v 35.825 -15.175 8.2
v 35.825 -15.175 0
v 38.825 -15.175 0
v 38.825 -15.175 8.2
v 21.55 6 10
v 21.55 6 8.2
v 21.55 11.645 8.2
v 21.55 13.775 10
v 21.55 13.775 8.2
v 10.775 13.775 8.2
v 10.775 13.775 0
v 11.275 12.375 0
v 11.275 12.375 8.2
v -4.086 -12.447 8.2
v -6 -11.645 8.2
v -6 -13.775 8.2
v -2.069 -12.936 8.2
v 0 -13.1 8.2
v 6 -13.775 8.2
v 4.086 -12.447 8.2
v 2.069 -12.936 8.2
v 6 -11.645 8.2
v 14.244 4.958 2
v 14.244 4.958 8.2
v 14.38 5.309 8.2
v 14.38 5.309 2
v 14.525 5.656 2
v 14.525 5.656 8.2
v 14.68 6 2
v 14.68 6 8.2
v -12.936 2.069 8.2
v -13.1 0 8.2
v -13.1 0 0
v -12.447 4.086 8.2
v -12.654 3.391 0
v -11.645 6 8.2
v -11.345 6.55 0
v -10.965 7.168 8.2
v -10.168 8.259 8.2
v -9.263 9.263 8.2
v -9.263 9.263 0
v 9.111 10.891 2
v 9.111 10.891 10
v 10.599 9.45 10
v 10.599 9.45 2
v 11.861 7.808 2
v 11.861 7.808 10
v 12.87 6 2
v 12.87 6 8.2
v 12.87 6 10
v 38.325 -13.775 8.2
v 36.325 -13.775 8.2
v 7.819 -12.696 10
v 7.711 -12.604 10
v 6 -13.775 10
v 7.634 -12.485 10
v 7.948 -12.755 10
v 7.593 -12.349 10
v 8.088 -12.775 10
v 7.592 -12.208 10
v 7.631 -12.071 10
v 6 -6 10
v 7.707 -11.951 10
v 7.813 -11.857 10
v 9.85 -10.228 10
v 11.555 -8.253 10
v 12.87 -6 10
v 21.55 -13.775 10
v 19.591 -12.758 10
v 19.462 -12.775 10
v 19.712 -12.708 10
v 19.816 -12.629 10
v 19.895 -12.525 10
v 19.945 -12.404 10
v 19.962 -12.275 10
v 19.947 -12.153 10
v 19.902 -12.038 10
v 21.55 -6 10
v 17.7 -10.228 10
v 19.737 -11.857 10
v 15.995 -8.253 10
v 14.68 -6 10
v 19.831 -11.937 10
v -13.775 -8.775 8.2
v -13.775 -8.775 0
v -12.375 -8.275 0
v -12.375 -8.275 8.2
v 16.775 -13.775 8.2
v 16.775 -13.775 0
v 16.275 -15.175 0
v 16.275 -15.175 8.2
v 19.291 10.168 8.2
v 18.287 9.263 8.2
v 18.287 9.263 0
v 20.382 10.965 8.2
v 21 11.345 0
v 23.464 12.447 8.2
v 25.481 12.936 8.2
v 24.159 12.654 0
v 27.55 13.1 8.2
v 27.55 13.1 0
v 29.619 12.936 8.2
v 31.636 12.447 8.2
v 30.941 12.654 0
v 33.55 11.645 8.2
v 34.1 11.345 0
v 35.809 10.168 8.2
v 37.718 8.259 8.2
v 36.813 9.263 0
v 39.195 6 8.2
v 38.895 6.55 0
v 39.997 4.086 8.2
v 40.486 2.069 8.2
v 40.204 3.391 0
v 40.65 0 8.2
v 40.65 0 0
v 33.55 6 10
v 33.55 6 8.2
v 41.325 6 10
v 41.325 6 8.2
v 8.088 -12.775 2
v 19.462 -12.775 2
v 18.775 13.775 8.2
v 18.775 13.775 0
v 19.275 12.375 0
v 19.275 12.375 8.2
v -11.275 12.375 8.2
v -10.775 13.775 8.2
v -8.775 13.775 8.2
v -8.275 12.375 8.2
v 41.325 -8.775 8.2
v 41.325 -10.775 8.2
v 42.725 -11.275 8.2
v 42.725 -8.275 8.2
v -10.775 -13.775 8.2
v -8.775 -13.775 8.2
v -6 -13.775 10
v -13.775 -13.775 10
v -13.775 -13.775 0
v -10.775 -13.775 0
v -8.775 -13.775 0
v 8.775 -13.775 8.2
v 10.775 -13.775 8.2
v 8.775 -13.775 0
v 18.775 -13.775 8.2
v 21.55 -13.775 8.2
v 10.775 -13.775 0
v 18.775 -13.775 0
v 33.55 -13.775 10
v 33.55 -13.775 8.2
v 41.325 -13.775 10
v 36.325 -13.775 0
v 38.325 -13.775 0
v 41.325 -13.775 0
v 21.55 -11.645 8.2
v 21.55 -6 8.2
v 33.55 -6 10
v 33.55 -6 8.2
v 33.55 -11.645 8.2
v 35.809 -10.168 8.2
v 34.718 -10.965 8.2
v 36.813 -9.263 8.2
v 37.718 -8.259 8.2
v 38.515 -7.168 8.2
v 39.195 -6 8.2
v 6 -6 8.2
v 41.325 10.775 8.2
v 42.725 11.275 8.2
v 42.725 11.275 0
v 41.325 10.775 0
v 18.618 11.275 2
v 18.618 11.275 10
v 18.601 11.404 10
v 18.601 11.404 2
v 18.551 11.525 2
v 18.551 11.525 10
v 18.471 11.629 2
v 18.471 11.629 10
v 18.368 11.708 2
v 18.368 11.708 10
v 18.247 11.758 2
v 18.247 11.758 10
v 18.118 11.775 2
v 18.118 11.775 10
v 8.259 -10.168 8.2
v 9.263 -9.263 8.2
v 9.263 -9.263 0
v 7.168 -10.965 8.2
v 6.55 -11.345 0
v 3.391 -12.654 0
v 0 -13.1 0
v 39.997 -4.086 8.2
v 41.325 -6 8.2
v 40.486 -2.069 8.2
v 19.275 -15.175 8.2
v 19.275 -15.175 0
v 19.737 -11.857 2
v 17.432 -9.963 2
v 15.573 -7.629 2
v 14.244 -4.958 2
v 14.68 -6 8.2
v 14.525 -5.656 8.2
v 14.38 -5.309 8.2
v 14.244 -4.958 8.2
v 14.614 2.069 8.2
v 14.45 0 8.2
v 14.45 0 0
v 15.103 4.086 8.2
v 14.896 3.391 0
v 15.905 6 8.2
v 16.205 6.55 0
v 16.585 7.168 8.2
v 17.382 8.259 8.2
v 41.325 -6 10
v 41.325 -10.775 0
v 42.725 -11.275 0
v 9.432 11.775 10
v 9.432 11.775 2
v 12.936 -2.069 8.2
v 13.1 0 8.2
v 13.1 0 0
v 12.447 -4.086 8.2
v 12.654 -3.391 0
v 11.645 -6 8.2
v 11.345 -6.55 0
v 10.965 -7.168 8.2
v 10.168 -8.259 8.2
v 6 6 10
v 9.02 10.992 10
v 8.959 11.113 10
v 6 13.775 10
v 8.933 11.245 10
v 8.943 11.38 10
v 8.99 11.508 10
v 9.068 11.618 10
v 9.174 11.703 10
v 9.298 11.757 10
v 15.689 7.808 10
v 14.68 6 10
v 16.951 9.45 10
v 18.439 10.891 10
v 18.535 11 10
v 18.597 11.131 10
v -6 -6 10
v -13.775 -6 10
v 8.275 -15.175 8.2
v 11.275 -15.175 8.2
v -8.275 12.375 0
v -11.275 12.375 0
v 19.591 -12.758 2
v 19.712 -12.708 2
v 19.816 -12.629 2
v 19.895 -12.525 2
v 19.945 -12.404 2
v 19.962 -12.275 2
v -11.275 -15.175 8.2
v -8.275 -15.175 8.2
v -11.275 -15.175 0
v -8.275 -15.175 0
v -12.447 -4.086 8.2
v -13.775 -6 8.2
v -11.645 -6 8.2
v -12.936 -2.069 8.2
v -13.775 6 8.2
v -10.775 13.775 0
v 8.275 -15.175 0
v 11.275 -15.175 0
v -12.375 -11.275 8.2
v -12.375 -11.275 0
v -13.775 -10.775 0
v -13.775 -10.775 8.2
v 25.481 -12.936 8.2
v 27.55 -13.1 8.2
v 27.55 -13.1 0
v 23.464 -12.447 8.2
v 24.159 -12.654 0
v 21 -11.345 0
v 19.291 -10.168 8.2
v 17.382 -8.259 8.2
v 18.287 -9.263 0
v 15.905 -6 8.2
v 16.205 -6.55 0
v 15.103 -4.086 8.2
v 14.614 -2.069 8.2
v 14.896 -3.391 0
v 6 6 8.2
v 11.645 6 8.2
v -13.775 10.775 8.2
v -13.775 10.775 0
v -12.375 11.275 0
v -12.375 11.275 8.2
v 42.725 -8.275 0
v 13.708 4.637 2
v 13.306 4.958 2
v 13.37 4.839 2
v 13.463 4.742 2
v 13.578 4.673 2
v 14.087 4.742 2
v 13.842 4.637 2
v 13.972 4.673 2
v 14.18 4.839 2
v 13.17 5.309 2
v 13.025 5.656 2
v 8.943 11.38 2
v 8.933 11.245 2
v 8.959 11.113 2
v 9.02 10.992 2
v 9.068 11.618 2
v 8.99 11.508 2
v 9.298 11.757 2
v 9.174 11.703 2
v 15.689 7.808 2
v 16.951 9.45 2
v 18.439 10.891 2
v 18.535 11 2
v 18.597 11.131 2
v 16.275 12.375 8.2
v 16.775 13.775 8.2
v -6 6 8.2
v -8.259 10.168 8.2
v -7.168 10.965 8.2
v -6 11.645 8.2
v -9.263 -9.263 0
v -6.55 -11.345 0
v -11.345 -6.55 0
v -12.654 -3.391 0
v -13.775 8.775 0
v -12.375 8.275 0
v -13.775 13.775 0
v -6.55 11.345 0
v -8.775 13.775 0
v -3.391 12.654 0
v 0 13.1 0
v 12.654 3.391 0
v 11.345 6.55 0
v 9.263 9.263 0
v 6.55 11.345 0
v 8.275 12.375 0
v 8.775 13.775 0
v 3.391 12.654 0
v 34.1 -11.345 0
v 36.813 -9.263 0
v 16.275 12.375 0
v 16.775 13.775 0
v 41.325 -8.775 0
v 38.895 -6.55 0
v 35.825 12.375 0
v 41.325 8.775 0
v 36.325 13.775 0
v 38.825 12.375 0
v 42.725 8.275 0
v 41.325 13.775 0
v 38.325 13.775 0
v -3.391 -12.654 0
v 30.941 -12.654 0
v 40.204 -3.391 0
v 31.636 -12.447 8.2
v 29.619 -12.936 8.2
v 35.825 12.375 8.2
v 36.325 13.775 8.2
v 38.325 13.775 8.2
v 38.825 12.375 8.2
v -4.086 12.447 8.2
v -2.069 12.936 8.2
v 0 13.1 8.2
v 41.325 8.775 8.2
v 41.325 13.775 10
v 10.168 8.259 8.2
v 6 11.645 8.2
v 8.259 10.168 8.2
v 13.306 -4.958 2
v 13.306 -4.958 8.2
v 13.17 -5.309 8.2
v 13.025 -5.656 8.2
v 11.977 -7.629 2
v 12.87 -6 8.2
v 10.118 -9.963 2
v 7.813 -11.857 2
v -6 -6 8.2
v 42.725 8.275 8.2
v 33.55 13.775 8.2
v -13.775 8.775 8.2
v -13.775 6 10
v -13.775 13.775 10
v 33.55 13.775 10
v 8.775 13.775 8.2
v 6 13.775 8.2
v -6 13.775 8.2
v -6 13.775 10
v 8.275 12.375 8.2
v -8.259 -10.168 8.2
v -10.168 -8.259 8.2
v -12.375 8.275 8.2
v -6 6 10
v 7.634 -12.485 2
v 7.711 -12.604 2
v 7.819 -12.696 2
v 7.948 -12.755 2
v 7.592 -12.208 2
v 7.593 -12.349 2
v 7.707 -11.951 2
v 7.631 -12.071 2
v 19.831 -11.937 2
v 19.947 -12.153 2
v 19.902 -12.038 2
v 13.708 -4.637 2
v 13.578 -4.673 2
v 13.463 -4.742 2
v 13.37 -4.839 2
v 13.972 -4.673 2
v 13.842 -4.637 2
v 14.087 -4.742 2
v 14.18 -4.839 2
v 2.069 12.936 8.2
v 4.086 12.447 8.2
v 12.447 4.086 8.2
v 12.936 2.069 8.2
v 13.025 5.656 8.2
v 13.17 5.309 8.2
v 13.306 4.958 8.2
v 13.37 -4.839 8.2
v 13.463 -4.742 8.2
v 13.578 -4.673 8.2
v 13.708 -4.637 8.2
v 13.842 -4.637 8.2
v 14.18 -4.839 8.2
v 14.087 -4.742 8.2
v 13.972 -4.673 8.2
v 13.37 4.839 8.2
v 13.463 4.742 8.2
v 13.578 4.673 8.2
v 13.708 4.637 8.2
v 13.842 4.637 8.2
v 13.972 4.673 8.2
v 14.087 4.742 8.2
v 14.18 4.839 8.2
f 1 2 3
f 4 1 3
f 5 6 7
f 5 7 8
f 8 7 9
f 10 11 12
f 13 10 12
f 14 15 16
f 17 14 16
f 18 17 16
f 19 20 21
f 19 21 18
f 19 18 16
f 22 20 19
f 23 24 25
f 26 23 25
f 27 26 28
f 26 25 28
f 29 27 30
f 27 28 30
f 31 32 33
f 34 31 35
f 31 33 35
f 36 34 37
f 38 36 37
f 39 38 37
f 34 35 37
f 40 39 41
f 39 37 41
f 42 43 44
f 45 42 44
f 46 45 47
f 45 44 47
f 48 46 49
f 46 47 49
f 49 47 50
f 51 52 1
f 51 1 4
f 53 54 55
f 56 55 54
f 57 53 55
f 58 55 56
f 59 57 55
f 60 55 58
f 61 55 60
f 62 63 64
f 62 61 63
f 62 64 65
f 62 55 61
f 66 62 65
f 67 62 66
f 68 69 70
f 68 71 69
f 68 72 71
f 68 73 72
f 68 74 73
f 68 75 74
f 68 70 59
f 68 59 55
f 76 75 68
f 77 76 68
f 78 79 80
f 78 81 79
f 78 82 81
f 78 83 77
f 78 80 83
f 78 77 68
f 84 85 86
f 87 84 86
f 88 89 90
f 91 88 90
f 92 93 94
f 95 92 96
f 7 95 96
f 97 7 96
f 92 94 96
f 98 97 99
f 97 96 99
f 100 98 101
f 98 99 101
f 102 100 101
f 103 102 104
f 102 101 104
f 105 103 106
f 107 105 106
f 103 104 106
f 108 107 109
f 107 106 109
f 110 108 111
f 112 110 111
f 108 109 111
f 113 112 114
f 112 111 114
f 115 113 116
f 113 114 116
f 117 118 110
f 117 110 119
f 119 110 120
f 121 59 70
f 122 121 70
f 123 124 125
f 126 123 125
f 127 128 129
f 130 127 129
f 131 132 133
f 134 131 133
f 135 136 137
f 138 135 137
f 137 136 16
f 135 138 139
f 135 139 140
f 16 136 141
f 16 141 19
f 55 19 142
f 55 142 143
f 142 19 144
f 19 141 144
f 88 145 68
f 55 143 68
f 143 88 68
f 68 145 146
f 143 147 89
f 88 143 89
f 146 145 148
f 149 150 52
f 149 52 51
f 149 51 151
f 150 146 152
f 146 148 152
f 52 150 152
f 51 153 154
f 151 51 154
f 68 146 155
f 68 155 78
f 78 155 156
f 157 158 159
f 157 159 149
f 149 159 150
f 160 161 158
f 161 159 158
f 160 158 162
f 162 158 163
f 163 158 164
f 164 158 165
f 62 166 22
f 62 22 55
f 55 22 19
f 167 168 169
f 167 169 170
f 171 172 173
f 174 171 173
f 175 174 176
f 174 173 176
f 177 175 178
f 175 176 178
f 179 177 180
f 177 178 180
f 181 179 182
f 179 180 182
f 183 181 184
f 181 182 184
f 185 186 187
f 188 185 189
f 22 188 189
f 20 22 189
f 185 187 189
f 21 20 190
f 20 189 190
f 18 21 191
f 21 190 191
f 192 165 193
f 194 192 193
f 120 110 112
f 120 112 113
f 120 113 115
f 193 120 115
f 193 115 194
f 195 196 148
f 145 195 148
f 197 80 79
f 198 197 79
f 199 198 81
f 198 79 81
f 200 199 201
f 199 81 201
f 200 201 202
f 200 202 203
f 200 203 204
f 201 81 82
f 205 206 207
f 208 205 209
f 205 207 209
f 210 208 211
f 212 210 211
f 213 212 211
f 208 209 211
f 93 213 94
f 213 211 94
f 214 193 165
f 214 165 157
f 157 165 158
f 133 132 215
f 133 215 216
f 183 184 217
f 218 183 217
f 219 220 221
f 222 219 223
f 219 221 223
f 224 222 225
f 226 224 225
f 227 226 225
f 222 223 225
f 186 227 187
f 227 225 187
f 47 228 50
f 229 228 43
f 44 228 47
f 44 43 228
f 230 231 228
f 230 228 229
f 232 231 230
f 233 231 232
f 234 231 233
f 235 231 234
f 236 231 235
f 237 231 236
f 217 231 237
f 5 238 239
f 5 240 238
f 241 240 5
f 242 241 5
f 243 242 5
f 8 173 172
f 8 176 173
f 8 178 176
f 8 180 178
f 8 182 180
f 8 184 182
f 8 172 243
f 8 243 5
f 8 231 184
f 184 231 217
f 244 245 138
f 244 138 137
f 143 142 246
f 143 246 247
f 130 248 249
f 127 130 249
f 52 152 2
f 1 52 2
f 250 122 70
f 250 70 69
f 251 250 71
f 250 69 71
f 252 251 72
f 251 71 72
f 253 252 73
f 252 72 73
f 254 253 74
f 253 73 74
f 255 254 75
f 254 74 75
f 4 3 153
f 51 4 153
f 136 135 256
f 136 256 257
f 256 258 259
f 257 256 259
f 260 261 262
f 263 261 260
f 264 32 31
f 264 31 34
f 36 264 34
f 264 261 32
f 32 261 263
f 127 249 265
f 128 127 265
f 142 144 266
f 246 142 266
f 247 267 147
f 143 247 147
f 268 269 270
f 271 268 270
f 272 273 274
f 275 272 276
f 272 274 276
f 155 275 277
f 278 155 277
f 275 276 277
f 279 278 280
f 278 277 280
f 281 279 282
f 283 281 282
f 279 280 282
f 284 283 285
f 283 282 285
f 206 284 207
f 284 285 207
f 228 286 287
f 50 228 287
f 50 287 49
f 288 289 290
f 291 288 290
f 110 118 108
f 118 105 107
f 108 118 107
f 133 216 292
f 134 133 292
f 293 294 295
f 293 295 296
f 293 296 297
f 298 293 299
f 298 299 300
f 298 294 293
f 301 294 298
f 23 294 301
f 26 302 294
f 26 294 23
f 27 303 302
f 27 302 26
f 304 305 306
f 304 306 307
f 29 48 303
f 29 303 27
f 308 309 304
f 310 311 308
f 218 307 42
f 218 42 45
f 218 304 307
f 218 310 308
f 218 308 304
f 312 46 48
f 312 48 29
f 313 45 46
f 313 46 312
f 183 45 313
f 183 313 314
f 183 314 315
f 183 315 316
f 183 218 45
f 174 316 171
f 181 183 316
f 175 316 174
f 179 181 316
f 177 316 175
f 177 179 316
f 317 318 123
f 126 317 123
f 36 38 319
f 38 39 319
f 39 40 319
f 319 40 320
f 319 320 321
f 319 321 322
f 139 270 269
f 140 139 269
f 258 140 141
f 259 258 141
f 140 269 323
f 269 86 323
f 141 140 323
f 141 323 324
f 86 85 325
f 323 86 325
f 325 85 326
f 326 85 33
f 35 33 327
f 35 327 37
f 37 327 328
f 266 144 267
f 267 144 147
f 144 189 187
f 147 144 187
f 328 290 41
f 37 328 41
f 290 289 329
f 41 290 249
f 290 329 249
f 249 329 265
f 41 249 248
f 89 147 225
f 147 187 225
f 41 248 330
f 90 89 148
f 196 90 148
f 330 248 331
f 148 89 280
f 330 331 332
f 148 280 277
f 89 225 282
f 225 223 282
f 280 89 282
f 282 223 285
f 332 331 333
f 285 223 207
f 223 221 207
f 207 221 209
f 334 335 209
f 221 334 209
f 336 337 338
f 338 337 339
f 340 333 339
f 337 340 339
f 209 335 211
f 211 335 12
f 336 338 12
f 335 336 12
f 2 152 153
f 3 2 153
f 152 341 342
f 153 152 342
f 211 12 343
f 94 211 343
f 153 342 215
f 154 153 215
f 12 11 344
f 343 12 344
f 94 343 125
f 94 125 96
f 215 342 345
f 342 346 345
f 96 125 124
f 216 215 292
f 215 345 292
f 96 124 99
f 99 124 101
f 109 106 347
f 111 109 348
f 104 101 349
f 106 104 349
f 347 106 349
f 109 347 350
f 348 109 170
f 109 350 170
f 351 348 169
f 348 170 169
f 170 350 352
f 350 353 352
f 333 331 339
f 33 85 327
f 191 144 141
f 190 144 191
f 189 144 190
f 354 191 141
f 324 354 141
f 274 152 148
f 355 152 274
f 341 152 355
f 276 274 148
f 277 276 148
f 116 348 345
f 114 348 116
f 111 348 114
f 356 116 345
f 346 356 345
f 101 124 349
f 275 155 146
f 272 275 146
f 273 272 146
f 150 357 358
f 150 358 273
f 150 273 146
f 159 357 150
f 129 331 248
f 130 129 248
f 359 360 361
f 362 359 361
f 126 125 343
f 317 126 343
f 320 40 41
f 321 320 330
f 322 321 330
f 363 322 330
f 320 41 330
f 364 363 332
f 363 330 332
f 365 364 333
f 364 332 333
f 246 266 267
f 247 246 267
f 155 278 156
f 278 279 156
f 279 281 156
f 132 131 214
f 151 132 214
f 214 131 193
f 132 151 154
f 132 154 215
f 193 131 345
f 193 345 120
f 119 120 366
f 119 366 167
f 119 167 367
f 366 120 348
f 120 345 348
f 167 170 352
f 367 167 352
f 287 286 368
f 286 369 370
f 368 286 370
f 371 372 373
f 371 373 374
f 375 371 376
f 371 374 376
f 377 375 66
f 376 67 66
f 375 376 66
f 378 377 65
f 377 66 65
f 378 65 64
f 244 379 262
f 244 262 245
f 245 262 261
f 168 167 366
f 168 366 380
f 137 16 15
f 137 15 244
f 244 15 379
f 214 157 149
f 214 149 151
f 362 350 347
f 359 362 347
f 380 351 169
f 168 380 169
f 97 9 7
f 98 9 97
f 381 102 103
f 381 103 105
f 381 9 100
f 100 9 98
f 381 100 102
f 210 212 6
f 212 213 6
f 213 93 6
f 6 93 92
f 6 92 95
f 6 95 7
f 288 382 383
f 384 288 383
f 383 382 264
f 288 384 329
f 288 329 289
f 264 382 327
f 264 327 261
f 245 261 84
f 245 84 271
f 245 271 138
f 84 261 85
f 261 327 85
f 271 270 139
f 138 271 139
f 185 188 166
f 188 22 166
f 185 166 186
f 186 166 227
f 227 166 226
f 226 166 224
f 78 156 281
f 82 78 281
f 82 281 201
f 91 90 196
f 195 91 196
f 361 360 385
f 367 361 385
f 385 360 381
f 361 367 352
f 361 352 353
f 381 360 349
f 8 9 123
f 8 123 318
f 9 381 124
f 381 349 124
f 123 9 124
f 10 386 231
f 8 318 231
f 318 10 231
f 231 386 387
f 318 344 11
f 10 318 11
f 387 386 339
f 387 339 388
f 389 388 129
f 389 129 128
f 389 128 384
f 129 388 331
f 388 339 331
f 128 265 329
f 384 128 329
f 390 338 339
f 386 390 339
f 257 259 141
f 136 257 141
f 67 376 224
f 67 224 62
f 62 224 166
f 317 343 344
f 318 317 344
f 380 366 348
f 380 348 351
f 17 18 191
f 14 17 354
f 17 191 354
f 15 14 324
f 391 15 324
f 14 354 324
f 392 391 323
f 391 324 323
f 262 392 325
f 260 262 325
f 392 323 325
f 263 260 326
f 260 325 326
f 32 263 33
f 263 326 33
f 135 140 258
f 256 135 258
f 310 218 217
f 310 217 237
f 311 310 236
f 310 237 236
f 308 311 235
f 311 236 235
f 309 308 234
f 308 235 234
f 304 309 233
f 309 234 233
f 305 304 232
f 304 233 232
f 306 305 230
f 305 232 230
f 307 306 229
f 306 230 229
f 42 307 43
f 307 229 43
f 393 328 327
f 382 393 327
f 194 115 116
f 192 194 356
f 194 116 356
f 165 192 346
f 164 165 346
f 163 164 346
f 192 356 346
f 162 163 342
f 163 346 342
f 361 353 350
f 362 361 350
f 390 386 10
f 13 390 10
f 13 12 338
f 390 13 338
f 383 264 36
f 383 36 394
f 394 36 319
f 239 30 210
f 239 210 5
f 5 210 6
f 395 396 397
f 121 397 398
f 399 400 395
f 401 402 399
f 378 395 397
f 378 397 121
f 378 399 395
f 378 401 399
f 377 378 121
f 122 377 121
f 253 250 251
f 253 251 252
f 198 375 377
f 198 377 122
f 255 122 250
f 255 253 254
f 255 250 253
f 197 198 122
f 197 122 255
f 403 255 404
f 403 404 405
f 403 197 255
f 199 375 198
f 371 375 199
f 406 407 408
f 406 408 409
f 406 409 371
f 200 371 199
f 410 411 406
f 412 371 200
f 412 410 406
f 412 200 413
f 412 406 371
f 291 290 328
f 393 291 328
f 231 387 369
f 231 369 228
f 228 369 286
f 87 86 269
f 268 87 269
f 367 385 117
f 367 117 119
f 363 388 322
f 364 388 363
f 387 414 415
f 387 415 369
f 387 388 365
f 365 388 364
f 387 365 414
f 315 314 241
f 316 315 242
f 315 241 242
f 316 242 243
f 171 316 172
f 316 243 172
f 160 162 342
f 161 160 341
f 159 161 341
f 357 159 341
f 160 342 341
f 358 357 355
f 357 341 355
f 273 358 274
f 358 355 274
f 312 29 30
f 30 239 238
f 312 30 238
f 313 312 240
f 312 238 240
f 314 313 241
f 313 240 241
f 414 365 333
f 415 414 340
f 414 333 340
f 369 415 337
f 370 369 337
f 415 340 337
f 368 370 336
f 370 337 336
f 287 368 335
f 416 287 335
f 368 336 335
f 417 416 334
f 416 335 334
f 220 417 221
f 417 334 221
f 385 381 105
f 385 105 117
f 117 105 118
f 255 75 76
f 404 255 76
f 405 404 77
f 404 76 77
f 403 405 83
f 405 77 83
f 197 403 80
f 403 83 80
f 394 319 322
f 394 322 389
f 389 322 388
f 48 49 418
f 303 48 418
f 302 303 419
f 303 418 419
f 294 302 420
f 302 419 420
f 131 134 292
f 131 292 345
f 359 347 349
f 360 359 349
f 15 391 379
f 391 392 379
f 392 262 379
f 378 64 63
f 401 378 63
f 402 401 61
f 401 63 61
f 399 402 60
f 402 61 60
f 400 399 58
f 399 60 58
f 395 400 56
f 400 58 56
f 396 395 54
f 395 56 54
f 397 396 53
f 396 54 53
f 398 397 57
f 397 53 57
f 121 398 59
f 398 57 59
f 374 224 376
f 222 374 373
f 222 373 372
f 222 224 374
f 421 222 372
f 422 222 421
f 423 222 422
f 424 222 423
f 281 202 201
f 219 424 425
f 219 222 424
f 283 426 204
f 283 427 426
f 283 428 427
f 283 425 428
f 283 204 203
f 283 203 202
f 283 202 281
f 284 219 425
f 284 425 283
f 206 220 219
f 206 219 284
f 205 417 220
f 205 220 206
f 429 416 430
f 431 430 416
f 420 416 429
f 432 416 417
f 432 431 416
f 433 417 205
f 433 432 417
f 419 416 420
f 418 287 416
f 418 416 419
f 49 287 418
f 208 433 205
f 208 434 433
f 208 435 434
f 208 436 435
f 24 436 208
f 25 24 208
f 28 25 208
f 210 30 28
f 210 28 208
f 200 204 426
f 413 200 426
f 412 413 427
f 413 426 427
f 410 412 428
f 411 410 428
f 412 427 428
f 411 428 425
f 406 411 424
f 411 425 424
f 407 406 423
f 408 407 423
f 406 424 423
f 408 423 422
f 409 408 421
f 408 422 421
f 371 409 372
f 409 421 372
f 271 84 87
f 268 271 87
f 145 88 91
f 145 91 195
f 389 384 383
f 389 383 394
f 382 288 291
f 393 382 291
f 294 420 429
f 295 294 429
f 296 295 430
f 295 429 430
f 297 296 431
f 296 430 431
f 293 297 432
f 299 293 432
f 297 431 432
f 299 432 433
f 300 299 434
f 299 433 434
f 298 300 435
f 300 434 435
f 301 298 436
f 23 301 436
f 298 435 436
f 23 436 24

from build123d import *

# Parameters (mm, degrees)
F1_DEPTH = 8.2
F3_DEPTH = 1.8
F5_DEPTH = 8


# Not quite as in the source:
# - a feature names something its author has since deleted; it is built from what else it names


with BuildPart() as f1:
    # F0 (on Top) → F1 (new body)
    with BuildSketch(Plane.XY):
        with BuildLine():
            Line((13.775, 10.775), (13.775, 13.775))
            Line((13.775, 13.775), (10.775, 13.775))
            Line((10.775, 13.775), (11.275, 12.375))
            Line((11.275, 12.375), (8.275, 12.375))
            Line((8.275, 12.375), (8.775, 13.775))
            Line((8.775, 13.775), (0, 13.775))
            Line((0, 13.775), (0, 13.1))
            ThreePointArc((0, 13.1), (9.2630988335, 9.2630988335), (13.1, 0))
            Line((13.1, 0), (13.775, 0))
            Line((13.775, 0), (13.775, 8.775))
            Line((13.775, 8.775), (13.775, 10.775))
        make_face()
        Polygon((15.175, 11.275), (13.775, 10.775), (13.775, 8.775), (15.175, 8.275), align=None)
        Polygon((15.175, -8.275), (13.775, -8.775), (13.775, -10.775), (15.175, -11.275), align=None)
        with BuildLine():
            Line((13.775, -8.775), (13.775, 0))
            Line((13.775, 0), (13.1, 0))
            ThreePointArc((13.1, 0), (12.1028218759, -5.013152964), (9.2630988335, -9.2630988335))
            Line((9.2630988335, -9.2630988335), (13.775, -13.775))
            Line((13.775, -13.775), (13.775, -10.775))
            Line((13.775, -10.775), (13.775, -8.775))
        make_face()
        with BuildLine():
            Line((13.775, -13.775), (9.2630988335, -9.2630988335))
            ThreePointArc((9.2630988335, -9.2630988335), (5.013152964, -12.1028218759), (0, -13.1))
            Line((0, -13.1), (0, -13.775))
            Line((0, -13.775), (8.775, -13.775))
            Line((8.775, -13.775), (10.775, -13.775))
            Line((10.775, -13.775), (13.775, -13.775))
        make_face()
        Polygon((11.275, -15.175), (10.775, -13.775), (8.775, -13.775), (8.275, -15.175), align=None)
        with BuildLine():
            ThreePointArc((0, -13.1), (-9.2630988335, -9.2630988335), (-13.1, 0))
            Line((-13.1, 0), (-13.775, 0))
            Line((-13.775, 0), (-13.775, -8.775))
            Line((-13.775, -8.775), (-12.375, -8.275))
            Line((-12.375, -8.275), (-12.375, -11.275))
            Line((-12.375, -11.275), (-13.775, -10.775))
            Line((-13.775, -10.775), (-13.775, -13.775))
            Line((-13.775, -13.775), (-10.775, -13.775))
            Line((-10.775, -13.775), (-8.775, -13.775))
            Line((-8.775, -13.775), (0, -13.775))
            Line((0, -13.775), (0, -13.1))
        make_face()
        Polygon((-8.275, -15.175), (-8.775, -13.775), (-10.775, -13.775), (-11.275, -15.175), align=None)
        with BuildLine():
            ThreePointArc((-13.1, 0), (-12.1028218759, 5.013152964), (-9.2630988335, 9.2630988335))
            Line((-9.2630988335, 9.2630988335), (-13.775, 13.775))
            Line((-13.775, 13.775), (-13.775, 10.775))
            Line((-13.775, 10.775), (-12.375, 11.275))
            Line((-12.375, 11.275), (-12.375, 8.275))
            Line((-12.375, 8.275), (-13.775, 8.775))
            Line((-13.775, 8.775), (-13.775, 0))
            Line((-13.775, 0), (-13.1, 0))
        make_face()
        with BuildLine():
            Line((0, 13.1), (0, 13.775))
            Line((0, 13.775), (-8.775, 13.775))
            Line((-8.775, 13.775), (-8.275, 12.375))
            Line((-8.275, 12.375), (-9.775, 12.375))
            Line((-9.775, 12.375), (-11.275, 12.375))
            Line((-11.275, 12.375), (-10.775, 13.775))
            Line((-10.775, 13.775), (-13.775, 13.775))
            Line((-13.775, 13.775), (-9.2630988335, 9.2630988335))
            ThreePointArc((-9.2630988335, 9.2630988335), (-5.013152964, 12.1028218759), (0, 13.1))
        make_face()
        with BuildLine():
            ThreePointArc((27.55, -13.1), (18.2869011665, -9.2630988335), (14.45, 0))
            Line((14.45, 0), (13.775, 0))
            Line((13.775, 0), (13.775, -8.775))
            Line((13.775, -8.775), (15.175, -8.275))
            Line((15.175, -8.275), (15.175, -11.275))
            Line((15.175, -11.275), (13.775, -10.775))
            Line((13.775, -10.775), (13.775, -13.775))
            Line((13.775, -13.775), (16.775, -13.775))
            Line((16.775, -13.775), (18.775, -13.775))
            Line((18.775, -13.775), (27.55, -13.775))
            Line((27.55, -13.775), (27.55, -13.1))
        make_face()
        with BuildLine():
            Line((18.2869011665, 9.2630988335), (13.775, 13.775))
            Line((13.775, 13.775), (13.775, 10.775))
            Line((13.775, 10.775), (15.175, 11.275))
            Line((15.175, 11.275), (15.175, 8.275))
            Line((15.175, 8.275), (13.775, 8.775))
            Line((13.775, 8.775), (13.775, 0))
            Line((13.775, 0), (14.45, 0))
            ThreePointArc((14.45, 0), (15.4471781241, 5.013152964), (18.2869011665, 9.2630988335))
        make_face()
        with BuildLine():
            Line((16.775, 13.775), (13.775, 13.775))
            Line((13.775, 13.775), (18.2869011665, 9.2630988335))
            ThreePointArc((18.2869011665, 9.2630988335), (22.536847036, 12.1028218759), (27.55, 13.1))
            Line((27.55, 13.1), (27.55, 13.775))
            Line((27.55, 13.775), (18.775, 13.775))
            Line((18.775, 13.775), (19.275, 12.375))
            Line((19.275, 12.375), (17.775, 12.375))
            Line((17.775, 12.375), (16.275, 12.375))
            Line((16.275, 12.375), (16.775, 13.775))
        make_face()
        with BuildLine():
            Line((27.55, 13.775), (27.55, 13.1))
            ThreePointArc((27.55, 13.1), (36.8130988335, 9.2630988335), (40.65, 0))
            Line((40.65, 0), (41.325, 0))
            Line((41.325, 0), (41.325, 8.775))
            Line((41.325, 8.775), (41.325, 10.775))
            Line((41.325, 10.775), (41.325, 13.775))
            Line((41.325, 13.775), (38.325, 13.775))
            Line((38.325, 13.775), (38.825, 12.375))
            Line((38.825, 12.375), (35.825, 12.375))
            Line((35.825, 12.375), (36.325, 13.775))
            Line((36.325, 13.775), (27.55, 13.775))
        make_face()
        Polygon((41.325, 10.775), (41.325, 8.775), (42.725, 8.275), (42.725, 11.275), align=None)
        Polygon((19.275, -15.175), (18.775, -13.775), (16.775, -13.775), (16.275, -15.175), align=None)
        Polygon((38.325, -13.775), (36.325, -13.775), (35.825, -15.175), (38.825, -15.175), align=None)
        Polygon((42.725, -8.275), (41.325, -8.775), (41.325, -10.775), (42.725, -11.275), align=None)
        with BuildLine():
            Line((41.325, 0), (40.65, 0))
            ThreePointArc((40.65, 0), (39.6528218759, -5.013152964), (36.8130988335, -9.2630988335))
            Line((36.8130988335, -9.2630988335), (41.325, -13.775))
            Line((41.325, -13.775), (41.325, -10.775))
            Line((41.325, -10.775), (41.325, -8.775))
            Line((41.325, -8.775), (41.325, 0))
        make_face()
        with BuildLine():
            ThreePointArc((36.8130988335, -9.2630988335), (32.563152964, -12.1028218759), (27.55, -13.1))
            Line((27.55, -13.1), (27.55, -13.775))
            Line((27.55, -13.775), (36.325, -13.775))
            Line((36.325, -13.775), (38.325, -13.775))
            Line((38.325, -13.775), (41.325, -13.775))
            Line((41.325, -13.775), (36.8130988335, -9.2630988335))
        make_face()
    extrude(amount=F1_DEPTH)

    # F2 (on face) → F3 (join)
    with BuildSketch(Plane.XY.offset(8.2)):
        Polygon((11.275, 12.375), (10.775, 13.775), (8.775, 13.775), (8.275, 12.375), align=None)
        Polygon((-8.775, 13.775), (-10.775, 13.775), (-11.275, 12.375), (-8.275, 12.375), align=None)
        Polygon((-12.375, 11.275), (-13.775, 10.775), (-13.775, 8.775), (-12.375, 8.275), align=None)
        Polygon((-13.775, -8.775), (-13.775, -10.775), (-12.375, -11.275), (-12.375, -8.275), align=None)
        Polygon((18.775, 13.775), (16.775, 13.775), (16.275, 12.375), (19.275, 12.375), align=None)
        Polygon((38.325, 13.775), (36.325, 13.775), (35.825, 12.375), (38.825, 12.375), align=None)
        with BuildLine():
            ThreePointArc((21.55, 11.6451706729), (18.2869011665, 9.2630988335), (15.9048293271, 6))
            Line((15.9048293271, 6), (21.55, 6))
            Line((21.55, 6), (21.55, 11.6451706729))
        make_face()
        with BuildLine():
            ThreePointArc((39.1951706729, 6), (36.8130988335, 9.2630988335), (33.55, 11.6451706729))
            Line((33.55, 11.6451706729), (33.55, 6))
            Line((33.55, 6), (39.1951706729, 6))
        make_face()
        with BuildLine():
            Line((33.55, -6), (33.55, -11.6451706729))
            ThreePointArc((33.55, -11.6451706729), (36.8130988335, -9.2630988335), (39.1951706729, -6))
            Line((39.1951706729, -6), (33.55, -6))
        make_face()
        with BuildLine():
            Line((21.55, -6), (15.9048293271, -6))
            ThreePointArc((15.9048293271, -6), (18.2869011665, -9.2630988335), (21.55, -11.6451706729))
            Line((21.55, -11.6451706729), (21.55, -6))
        make_face()
        with BuildLine():
            Line((-9.2630988335, 9.2630988335), (-6, 6))
            Line((-6, 6), (-6, 11.6451706729))
            ThreePointArc((-6, 11.6451706729), (-7.7239311922, 10.5806846157), (-9.2630988335, 9.2630988335))
        make_face()
        with BuildLine():
            Line((-11.6451706729, 6), (-6, 6))
            Line((-6, 6), (-9.2630988335, 9.2630988335))
            ThreePointArc((-9.2630988335, 9.2630988335), (-10.5806846157, 7.7239311922), (-11.6451706729, 6))
        make_face()
        with BuildLine():
            Line((11.6451706729, -6), (6, -6))
            Line((6, -6), (9.2630988335, -9.2630988335))
            ThreePointArc((9.2630988335, -9.2630988335), (10.5806846157, -7.7239311922), (11.6451706729, -6))
        make_face()
        with BuildLine():
            Line((9.2630988335, -9.2630988335), (6, -6))
            Line((6, -6), (6, -11.6451706729))
            ThreePointArc((6, -11.6451706729), (7.7239311922, -10.5806846157), (9.2630988335, -9.2630988335))
        make_face()
        with BuildLine():
            Line((6, 11.6451706729), (6, 6))
            Line((6, 6), (9.2630988335, 9.2630988335))
            ThreePointArc((9.2630988335, 9.2630988335), (7.7239311922, 10.5806846157), (6, 11.6451706729))
        make_face()
        with BuildLine():
            Line((9.2630988335, 9.2630988335), (6, 6))
            Line((6, 6), (11.6451706729, 6))
            ThreePointArc((11.6451706729, 6), (10.5806846157, 7.7239311922), (9.2630988335, 9.2630988335))
        make_face()
        with BuildLine():
            Line((-9.2630988335, -9.2630988335), (-6, -6))
            Line((-6, -6), (-11.6451706729, -6))
            ThreePointArc((-11.6451706729, -6), (-10.5806846157, -7.7239311922), (-9.2630988335, -9.2630988335))
        make_face()
        with BuildLine():
            Line((-6, -11.6451706729), (-6, -6))
            Line((-6, -6), (-9.2630988335, -9.2630988335))
            ThreePointArc((-9.2630988335, -9.2630988335), (-7.7239311922, -10.5806846157), (-6, -11.6451706729))
        make_face()
        with BuildLine():
            Line((13.775, -13.775), (9.2630988335, -9.2630988335))
            ThreePointArc((9.2630988335, -9.2630988335), (7.7239311922, -10.5806846157), (6, -11.6451706729))
            Line((6, -11.6451706729), (6, -13.775))
            Line((6, -13.775), (8.775, -13.775))
            Line((8.775, -13.775), (10.775, -13.775))
            Line((10.775, -13.775), (13.775, -13.775))
        make_face()
        with BuildLine():
            ThreePointArc((11.6451706729, -6), (10.5806846157, -7.7239311922), (9.2630988335, -9.2630988335))
            Line((9.2630988335, -9.2630988335), (13.775, -13.775))
            Line((13.775, -13.775), (13.775, -6))
            Line((13.775, -6), (11.6451706729, -6))
        make_face()
        with BuildLine():
            ThreePointArc((-11.6451706729, 6), (-10.5806846157, 7.7239311922), (-9.2630988335, 9.2630988335))
            Line((-9.2630988335, 9.2630988335), (-13.775, 13.775))
            Line((-13.775, 13.775), (-13.775, 10.775))
            Line((-13.775, 10.775), (-12.375, 11.275))
            Line((-12.375, 11.275), (-12.375, 8.275))
            Line((-12.375, 8.275), (-13.775, 8.775))
            Line((-13.775, 8.775), (-13.775, 6))
            Line((-13.775, 6), (-11.6451706729, 6))
        make_face()
        with BuildLine():
            Line((-13.775, 13.775), (-9.2630988335, 9.2630988335))
            ThreePointArc((-9.2630988335, 9.2630988335), (-7.7239311922, 10.5806846157), (-6, 11.6451706729))
            Line((-6, 11.6451706729), (-6, 13.775))
            Line((-6, 13.775), (-8.775, 13.775))
            Line((-8.775, 13.775), (-8.275, 12.375))
            Line((-8.275, 12.375), (-11.275, 12.375))
            Line((-11.275, 12.375), (-10.775, 13.775))
            Line((-10.775, 13.775), (-13.775, 13.775))
        make_face()
        with BuildLine():
            ThreePointArc((6, 11.6451706729), (7.7239311922, 10.5806846157), (9.2630988335, 9.2630988335))
            Line((9.2630988335, 9.2630988335), (13.775, 13.775))
            Line((13.775, 13.775), (10.775, 13.775))
            Line((10.775, 13.775), (11.275, 12.375))
            Line((11.275, 12.375), (8.275, 12.375))
            Line((8.275, 12.375), (8.775, 13.775))
            Line((8.775, 13.775), (6, 13.775))
            Line((6, 13.775), (6, 11.6451706729))
        make_face()
        with BuildLine():
            Line((13.775, 13.775), (9.2630988335, 9.2630988335))
            ThreePointArc((9.2630988335, 9.2630988335), (10.5806846157, 7.7239311922), (11.6451706729, 6))
            Line((11.6451706729, 6), (13.775, 6))
            Line((13.775, 6), (13.775, 13.775))
        make_face()
        with BuildLine():
            Line((-13.775, -13.775), (-9.2630988335, -9.2630988335))
            ThreePointArc((-9.2630988335, -9.2630988335), (-10.5806846157, -7.7239311922), (-11.6451706729, -6))
            Line((-11.6451706729, -6), (-13.775, -6))
            Line((-13.775, -6), (-13.775, -8.775))
            Line((-13.775, -8.775), (-12.375, -8.275))
            Line((-12.375, -8.275), (-12.375, -11.275))
            Line((-12.375, -11.275), (-13.775, -10.775))
            Line((-13.775, -10.775), (-13.775, -13.775))
        make_face()
        with BuildLine():
            ThreePointArc((-6, -11.6451706729), (-7.7239311922, -10.5806846157), (-9.2630988335, -9.2630988335))
            Line((-9.2630988335, -9.2630988335), (-13.775, -13.775))
            Line((-13.775, -13.775), (-10.775, -13.775))
            Line((-10.775, -13.775), (-8.775, -13.775))
            Line((-8.775, -13.775), (-6, -13.775))
            Line((-6, -13.775), (-6, -11.6451706729))
        make_face()
        with BuildLine():
            Line((16.775, 13.775), (13.775, 13.775))
            Line((13.775, 13.775), (13.775, 6))
            Line((13.775, 6), (15.9048293271, 6))
            ThreePointArc((15.9048293271, 6), (18.2869011665, 9.2630988335), (21.55, 11.6451706729))
            Line((21.55, 11.6451706729), (21.55, 13.775))
            Line((21.55, 13.775), (18.775, 13.775))
            Line((18.775, 13.775), (19.275, 12.375))
            Line((19.275, 12.375), (16.275, 12.375))
            Line((16.275, 12.375), (16.775, 13.775))
        make_face()
        with BuildLine():
            Line((33.55, 13.775), (33.55, 11.6451706729))
            ThreePointArc((33.55, 11.6451706729), (36.8130988335, 9.2630988335), (39.1951706729, 6))
            Line((39.1951706729, 6), (41.325, 6))
            Line((41.325, 6), (41.325, 8.775))
            Line((41.325, 8.775), (41.325, 10.775))
            Line((41.325, 10.775), (41.325, 13.775))
            Line((41.325, 13.775), (38.325, 13.775))
            Line((38.325, 13.775), (38.825, 12.375))
            Line((38.825, 12.375), (35.825, 12.375))
            Line((35.825, 12.375), (36.325, 13.775))
            Line((36.325, 13.775), (33.55, 13.775))
        make_face()
        with BuildLine():
            ThreePointArc((39.1951706729, -6), (36.8130988335, -9.2630988335), (33.55, -11.6451706729))
            Line((33.55, -11.6451706729), (33.55, -13.775))
            Line((33.55, -13.775), (36.325, -13.775))
            Line((36.325, -13.775), (38.325, -13.775))
            Line((38.325, -13.775), (41.325, -13.775))
            Line((41.325, -13.775), (41.325, -10.775))
            Line((41.325, -10.775), (41.325, -8.775))
            Line((41.325, -8.775), (41.325, -6))
            Line((41.325, -6), (39.1951706729, -6))
        make_face()
        with BuildLine():
            Line((13.775, -6), (13.775, -13.775))
            Line((13.775, -13.775), (16.775, -13.775))
            Line((16.775, -13.775), (18.775, -13.775))
            Line((18.775, -13.775), (21.55, -13.775))
            Line((21.55, -13.775), (21.55, -11.6451706729))
            ThreePointArc((21.55, -11.6451706729), (18.2869011665, -9.2630988335), (15.9048293271, -6))
            Line((15.9048293271, -6), (13.775, -6))
        make_face()
    extrude(amount=F3_DEPTH)

    # F4 (on face) → F5 (cut)
    with BuildSketch(Plane.XY.offset(10)):
        with BuildLine():
            ThreePointArc((14.275, -5.1321900783), (13.6863115297, -5.6242615723), (13.3064625791, -4.9576258059))
            ThreePointArc((13.3064625791, -4.9576258059), (11.1089149295, -8.8448860417), (7.8128161467, -11.8574830321))
            ThreePointArc((7.8128161467, -11.8574830321), (8.3250338925, -11.8348014024), (8.587915368, -12.275))
            ThreePointArc((8.587915368, -12.275), (8.4414687586, -12.6285533906), (8.087915368, -12.775))
            Line((8.087915368, -12.775), (19.462084632, -12.775))
            ThreePointArc((19.462084632, -12.775), (18.9831490904, -12.1314007418), (19.737183786, -11.8574829878))
            ThreePointArc((19.737183786, -11.8574829878), (16.4410850319, -8.8448859932), (14.2435374058, -4.9576257653))
            ThreePointArc((14.2435374058, -4.9576257653), (14.2670714902, -5.0435015867), (14.275, -5.1321900783))
        make_face()
        with BuildLine():
            ThreePointArc((8.587915368, -12.275), (8.3250338925, -11.8348014024), (7.8128161467, -11.8574830321))
            ThreePointArc((7.8128161467, -11.8574830321), (7.6089798379, -12.4185992968), (8.087915368, -12.775))
            ThreePointArc((8.087915368, -12.775), (8.4414687586, -12.6285533906), (8.587915368, -12.275))
        make_face()
        with BuildLine():
            ThreePointArc((19.962084632, -12.275), (19.9022832105, -12.03788144), (19.737183786, -11.8574829878))
            ThreePointArc((19.737183786, -11.8574829878), (18.9831490904, -12.1314007418), (19.462084632, -12.775))
            ThreePointArc((19.462084632, -12.775), (19.8156380226, -12.6285533906), (19.962084632, -12.275))
        make_face()
        with BuildLine():
            ThreePointArc((14.275, 5.1321900783), (13.6863115269, 5.6242615719), (13.306462581, 4.9576258007))
            ThreePointArc((13.306462581, 4.9576258007), (13.7749999905, 4.6321900783), (14.2435374124, 4.957625783))
            ThreePointArc((14.2435374124, 4.957625783), (14.2670714919, 5.0435015959), (14.275, 5.1321900783))
        make_face()
        with BuildLine():
            ThreePointArc((9.1112733402, 10.8914965969), (11.2595338629, 8.6523347826), (12.8701204346, 6))
            Line((12.8701204346, 6), (14.6798795654, 6))
            ThreePointArc((14.6798795654, 6), (16.2904661313, 8.6523347751), (18.4387266452, 10.8914965847))
            ThreePointArc((18.4387266452, 10.8914965847), (17.6479328663, 11.1043420199), (18.1179071781, 11.775))
            Line((18.1179071781, 11.775), (9.4320928219, 11.775))
            ThreePointArc((9.4320928219, 11.775), (9.7856462124, 11.6285533906), (9.9320928219, 11.275))
            ThreePointArc((9.9320928219, 11.275), (9.6437414211, 10.8220045581), (9.1112733402, 10.8914965969))
        make_face()
        with BuildLine():
            ThreePointArc((9.4320928219, 11.775), (8.9621185132, 11.445657989), (9.1112733402, 10.8914965969))
            ThreePointArc((9.1112733402, 10.8914965969), (9.6437414211, 10.8220045581), (9.9320928219, 11.275))
            ThreePointArc((9.9320928219, 11.275), (9.7856462124, 11.6285533906), (9.4320928219, 11.775))
        make_face()
        with BuildLine():
            ThreePointArc((18.1179071781, 11.775), (17.6479328663, 11.1043420199), (18.4387266452, 10.8914965847))
            ThreePointArc((18.4387266452, 10.8914965847), (18.570902616, 11.0633513921), (18.6179071781, 11.275))
            ThreePointArc((18.6179071781, 11.275), (18.4714605687, 11.6285533906), (18.1179071781, 11.775))
        make_face()
        with BuildLine():
            ThreePointArc((12.8701204346, 6), (13.0986644581, 5.4831550602), (13.306462581, 4.9576258007))
            ThreePointArc((13.306462581, 4.9576258007), (13.6863115269, 5.6242615719), (14.275, 5.1321900783))
            ThreePointArc((14.275, 5.1321900783), (14.2670714919, 5.0435015959), (14.2435374124, 4.957625783))
            ThreePointArc((14.2435374124, 4.957625783), (14.4513355383, 5.4831550515), (14.6798795654, 6))
            Line((14.6798795654, 6), (12.8701204346, 6))
        make_face()
        with BuildLine():
            ThreePointArc((14.2435374058, -4.9576257653), (13.7749999783, -4.6321900783), (13.3064625791, -4.9576258059))
            ThreePointArc((13.3064625791, -4.9576258059), (13.6863115297, -5.6242615723), (14.275, -5.1321900783))
            ThreePointArc((14.275, -5.1321900783), (14.2670714902, -5.0435015867), (14.2435374058, -4.9576257653))
        make_face()
    extrude(amount=-F5_DEPTH, mode=Mode.SUBTRACT)


solid = f1.part
